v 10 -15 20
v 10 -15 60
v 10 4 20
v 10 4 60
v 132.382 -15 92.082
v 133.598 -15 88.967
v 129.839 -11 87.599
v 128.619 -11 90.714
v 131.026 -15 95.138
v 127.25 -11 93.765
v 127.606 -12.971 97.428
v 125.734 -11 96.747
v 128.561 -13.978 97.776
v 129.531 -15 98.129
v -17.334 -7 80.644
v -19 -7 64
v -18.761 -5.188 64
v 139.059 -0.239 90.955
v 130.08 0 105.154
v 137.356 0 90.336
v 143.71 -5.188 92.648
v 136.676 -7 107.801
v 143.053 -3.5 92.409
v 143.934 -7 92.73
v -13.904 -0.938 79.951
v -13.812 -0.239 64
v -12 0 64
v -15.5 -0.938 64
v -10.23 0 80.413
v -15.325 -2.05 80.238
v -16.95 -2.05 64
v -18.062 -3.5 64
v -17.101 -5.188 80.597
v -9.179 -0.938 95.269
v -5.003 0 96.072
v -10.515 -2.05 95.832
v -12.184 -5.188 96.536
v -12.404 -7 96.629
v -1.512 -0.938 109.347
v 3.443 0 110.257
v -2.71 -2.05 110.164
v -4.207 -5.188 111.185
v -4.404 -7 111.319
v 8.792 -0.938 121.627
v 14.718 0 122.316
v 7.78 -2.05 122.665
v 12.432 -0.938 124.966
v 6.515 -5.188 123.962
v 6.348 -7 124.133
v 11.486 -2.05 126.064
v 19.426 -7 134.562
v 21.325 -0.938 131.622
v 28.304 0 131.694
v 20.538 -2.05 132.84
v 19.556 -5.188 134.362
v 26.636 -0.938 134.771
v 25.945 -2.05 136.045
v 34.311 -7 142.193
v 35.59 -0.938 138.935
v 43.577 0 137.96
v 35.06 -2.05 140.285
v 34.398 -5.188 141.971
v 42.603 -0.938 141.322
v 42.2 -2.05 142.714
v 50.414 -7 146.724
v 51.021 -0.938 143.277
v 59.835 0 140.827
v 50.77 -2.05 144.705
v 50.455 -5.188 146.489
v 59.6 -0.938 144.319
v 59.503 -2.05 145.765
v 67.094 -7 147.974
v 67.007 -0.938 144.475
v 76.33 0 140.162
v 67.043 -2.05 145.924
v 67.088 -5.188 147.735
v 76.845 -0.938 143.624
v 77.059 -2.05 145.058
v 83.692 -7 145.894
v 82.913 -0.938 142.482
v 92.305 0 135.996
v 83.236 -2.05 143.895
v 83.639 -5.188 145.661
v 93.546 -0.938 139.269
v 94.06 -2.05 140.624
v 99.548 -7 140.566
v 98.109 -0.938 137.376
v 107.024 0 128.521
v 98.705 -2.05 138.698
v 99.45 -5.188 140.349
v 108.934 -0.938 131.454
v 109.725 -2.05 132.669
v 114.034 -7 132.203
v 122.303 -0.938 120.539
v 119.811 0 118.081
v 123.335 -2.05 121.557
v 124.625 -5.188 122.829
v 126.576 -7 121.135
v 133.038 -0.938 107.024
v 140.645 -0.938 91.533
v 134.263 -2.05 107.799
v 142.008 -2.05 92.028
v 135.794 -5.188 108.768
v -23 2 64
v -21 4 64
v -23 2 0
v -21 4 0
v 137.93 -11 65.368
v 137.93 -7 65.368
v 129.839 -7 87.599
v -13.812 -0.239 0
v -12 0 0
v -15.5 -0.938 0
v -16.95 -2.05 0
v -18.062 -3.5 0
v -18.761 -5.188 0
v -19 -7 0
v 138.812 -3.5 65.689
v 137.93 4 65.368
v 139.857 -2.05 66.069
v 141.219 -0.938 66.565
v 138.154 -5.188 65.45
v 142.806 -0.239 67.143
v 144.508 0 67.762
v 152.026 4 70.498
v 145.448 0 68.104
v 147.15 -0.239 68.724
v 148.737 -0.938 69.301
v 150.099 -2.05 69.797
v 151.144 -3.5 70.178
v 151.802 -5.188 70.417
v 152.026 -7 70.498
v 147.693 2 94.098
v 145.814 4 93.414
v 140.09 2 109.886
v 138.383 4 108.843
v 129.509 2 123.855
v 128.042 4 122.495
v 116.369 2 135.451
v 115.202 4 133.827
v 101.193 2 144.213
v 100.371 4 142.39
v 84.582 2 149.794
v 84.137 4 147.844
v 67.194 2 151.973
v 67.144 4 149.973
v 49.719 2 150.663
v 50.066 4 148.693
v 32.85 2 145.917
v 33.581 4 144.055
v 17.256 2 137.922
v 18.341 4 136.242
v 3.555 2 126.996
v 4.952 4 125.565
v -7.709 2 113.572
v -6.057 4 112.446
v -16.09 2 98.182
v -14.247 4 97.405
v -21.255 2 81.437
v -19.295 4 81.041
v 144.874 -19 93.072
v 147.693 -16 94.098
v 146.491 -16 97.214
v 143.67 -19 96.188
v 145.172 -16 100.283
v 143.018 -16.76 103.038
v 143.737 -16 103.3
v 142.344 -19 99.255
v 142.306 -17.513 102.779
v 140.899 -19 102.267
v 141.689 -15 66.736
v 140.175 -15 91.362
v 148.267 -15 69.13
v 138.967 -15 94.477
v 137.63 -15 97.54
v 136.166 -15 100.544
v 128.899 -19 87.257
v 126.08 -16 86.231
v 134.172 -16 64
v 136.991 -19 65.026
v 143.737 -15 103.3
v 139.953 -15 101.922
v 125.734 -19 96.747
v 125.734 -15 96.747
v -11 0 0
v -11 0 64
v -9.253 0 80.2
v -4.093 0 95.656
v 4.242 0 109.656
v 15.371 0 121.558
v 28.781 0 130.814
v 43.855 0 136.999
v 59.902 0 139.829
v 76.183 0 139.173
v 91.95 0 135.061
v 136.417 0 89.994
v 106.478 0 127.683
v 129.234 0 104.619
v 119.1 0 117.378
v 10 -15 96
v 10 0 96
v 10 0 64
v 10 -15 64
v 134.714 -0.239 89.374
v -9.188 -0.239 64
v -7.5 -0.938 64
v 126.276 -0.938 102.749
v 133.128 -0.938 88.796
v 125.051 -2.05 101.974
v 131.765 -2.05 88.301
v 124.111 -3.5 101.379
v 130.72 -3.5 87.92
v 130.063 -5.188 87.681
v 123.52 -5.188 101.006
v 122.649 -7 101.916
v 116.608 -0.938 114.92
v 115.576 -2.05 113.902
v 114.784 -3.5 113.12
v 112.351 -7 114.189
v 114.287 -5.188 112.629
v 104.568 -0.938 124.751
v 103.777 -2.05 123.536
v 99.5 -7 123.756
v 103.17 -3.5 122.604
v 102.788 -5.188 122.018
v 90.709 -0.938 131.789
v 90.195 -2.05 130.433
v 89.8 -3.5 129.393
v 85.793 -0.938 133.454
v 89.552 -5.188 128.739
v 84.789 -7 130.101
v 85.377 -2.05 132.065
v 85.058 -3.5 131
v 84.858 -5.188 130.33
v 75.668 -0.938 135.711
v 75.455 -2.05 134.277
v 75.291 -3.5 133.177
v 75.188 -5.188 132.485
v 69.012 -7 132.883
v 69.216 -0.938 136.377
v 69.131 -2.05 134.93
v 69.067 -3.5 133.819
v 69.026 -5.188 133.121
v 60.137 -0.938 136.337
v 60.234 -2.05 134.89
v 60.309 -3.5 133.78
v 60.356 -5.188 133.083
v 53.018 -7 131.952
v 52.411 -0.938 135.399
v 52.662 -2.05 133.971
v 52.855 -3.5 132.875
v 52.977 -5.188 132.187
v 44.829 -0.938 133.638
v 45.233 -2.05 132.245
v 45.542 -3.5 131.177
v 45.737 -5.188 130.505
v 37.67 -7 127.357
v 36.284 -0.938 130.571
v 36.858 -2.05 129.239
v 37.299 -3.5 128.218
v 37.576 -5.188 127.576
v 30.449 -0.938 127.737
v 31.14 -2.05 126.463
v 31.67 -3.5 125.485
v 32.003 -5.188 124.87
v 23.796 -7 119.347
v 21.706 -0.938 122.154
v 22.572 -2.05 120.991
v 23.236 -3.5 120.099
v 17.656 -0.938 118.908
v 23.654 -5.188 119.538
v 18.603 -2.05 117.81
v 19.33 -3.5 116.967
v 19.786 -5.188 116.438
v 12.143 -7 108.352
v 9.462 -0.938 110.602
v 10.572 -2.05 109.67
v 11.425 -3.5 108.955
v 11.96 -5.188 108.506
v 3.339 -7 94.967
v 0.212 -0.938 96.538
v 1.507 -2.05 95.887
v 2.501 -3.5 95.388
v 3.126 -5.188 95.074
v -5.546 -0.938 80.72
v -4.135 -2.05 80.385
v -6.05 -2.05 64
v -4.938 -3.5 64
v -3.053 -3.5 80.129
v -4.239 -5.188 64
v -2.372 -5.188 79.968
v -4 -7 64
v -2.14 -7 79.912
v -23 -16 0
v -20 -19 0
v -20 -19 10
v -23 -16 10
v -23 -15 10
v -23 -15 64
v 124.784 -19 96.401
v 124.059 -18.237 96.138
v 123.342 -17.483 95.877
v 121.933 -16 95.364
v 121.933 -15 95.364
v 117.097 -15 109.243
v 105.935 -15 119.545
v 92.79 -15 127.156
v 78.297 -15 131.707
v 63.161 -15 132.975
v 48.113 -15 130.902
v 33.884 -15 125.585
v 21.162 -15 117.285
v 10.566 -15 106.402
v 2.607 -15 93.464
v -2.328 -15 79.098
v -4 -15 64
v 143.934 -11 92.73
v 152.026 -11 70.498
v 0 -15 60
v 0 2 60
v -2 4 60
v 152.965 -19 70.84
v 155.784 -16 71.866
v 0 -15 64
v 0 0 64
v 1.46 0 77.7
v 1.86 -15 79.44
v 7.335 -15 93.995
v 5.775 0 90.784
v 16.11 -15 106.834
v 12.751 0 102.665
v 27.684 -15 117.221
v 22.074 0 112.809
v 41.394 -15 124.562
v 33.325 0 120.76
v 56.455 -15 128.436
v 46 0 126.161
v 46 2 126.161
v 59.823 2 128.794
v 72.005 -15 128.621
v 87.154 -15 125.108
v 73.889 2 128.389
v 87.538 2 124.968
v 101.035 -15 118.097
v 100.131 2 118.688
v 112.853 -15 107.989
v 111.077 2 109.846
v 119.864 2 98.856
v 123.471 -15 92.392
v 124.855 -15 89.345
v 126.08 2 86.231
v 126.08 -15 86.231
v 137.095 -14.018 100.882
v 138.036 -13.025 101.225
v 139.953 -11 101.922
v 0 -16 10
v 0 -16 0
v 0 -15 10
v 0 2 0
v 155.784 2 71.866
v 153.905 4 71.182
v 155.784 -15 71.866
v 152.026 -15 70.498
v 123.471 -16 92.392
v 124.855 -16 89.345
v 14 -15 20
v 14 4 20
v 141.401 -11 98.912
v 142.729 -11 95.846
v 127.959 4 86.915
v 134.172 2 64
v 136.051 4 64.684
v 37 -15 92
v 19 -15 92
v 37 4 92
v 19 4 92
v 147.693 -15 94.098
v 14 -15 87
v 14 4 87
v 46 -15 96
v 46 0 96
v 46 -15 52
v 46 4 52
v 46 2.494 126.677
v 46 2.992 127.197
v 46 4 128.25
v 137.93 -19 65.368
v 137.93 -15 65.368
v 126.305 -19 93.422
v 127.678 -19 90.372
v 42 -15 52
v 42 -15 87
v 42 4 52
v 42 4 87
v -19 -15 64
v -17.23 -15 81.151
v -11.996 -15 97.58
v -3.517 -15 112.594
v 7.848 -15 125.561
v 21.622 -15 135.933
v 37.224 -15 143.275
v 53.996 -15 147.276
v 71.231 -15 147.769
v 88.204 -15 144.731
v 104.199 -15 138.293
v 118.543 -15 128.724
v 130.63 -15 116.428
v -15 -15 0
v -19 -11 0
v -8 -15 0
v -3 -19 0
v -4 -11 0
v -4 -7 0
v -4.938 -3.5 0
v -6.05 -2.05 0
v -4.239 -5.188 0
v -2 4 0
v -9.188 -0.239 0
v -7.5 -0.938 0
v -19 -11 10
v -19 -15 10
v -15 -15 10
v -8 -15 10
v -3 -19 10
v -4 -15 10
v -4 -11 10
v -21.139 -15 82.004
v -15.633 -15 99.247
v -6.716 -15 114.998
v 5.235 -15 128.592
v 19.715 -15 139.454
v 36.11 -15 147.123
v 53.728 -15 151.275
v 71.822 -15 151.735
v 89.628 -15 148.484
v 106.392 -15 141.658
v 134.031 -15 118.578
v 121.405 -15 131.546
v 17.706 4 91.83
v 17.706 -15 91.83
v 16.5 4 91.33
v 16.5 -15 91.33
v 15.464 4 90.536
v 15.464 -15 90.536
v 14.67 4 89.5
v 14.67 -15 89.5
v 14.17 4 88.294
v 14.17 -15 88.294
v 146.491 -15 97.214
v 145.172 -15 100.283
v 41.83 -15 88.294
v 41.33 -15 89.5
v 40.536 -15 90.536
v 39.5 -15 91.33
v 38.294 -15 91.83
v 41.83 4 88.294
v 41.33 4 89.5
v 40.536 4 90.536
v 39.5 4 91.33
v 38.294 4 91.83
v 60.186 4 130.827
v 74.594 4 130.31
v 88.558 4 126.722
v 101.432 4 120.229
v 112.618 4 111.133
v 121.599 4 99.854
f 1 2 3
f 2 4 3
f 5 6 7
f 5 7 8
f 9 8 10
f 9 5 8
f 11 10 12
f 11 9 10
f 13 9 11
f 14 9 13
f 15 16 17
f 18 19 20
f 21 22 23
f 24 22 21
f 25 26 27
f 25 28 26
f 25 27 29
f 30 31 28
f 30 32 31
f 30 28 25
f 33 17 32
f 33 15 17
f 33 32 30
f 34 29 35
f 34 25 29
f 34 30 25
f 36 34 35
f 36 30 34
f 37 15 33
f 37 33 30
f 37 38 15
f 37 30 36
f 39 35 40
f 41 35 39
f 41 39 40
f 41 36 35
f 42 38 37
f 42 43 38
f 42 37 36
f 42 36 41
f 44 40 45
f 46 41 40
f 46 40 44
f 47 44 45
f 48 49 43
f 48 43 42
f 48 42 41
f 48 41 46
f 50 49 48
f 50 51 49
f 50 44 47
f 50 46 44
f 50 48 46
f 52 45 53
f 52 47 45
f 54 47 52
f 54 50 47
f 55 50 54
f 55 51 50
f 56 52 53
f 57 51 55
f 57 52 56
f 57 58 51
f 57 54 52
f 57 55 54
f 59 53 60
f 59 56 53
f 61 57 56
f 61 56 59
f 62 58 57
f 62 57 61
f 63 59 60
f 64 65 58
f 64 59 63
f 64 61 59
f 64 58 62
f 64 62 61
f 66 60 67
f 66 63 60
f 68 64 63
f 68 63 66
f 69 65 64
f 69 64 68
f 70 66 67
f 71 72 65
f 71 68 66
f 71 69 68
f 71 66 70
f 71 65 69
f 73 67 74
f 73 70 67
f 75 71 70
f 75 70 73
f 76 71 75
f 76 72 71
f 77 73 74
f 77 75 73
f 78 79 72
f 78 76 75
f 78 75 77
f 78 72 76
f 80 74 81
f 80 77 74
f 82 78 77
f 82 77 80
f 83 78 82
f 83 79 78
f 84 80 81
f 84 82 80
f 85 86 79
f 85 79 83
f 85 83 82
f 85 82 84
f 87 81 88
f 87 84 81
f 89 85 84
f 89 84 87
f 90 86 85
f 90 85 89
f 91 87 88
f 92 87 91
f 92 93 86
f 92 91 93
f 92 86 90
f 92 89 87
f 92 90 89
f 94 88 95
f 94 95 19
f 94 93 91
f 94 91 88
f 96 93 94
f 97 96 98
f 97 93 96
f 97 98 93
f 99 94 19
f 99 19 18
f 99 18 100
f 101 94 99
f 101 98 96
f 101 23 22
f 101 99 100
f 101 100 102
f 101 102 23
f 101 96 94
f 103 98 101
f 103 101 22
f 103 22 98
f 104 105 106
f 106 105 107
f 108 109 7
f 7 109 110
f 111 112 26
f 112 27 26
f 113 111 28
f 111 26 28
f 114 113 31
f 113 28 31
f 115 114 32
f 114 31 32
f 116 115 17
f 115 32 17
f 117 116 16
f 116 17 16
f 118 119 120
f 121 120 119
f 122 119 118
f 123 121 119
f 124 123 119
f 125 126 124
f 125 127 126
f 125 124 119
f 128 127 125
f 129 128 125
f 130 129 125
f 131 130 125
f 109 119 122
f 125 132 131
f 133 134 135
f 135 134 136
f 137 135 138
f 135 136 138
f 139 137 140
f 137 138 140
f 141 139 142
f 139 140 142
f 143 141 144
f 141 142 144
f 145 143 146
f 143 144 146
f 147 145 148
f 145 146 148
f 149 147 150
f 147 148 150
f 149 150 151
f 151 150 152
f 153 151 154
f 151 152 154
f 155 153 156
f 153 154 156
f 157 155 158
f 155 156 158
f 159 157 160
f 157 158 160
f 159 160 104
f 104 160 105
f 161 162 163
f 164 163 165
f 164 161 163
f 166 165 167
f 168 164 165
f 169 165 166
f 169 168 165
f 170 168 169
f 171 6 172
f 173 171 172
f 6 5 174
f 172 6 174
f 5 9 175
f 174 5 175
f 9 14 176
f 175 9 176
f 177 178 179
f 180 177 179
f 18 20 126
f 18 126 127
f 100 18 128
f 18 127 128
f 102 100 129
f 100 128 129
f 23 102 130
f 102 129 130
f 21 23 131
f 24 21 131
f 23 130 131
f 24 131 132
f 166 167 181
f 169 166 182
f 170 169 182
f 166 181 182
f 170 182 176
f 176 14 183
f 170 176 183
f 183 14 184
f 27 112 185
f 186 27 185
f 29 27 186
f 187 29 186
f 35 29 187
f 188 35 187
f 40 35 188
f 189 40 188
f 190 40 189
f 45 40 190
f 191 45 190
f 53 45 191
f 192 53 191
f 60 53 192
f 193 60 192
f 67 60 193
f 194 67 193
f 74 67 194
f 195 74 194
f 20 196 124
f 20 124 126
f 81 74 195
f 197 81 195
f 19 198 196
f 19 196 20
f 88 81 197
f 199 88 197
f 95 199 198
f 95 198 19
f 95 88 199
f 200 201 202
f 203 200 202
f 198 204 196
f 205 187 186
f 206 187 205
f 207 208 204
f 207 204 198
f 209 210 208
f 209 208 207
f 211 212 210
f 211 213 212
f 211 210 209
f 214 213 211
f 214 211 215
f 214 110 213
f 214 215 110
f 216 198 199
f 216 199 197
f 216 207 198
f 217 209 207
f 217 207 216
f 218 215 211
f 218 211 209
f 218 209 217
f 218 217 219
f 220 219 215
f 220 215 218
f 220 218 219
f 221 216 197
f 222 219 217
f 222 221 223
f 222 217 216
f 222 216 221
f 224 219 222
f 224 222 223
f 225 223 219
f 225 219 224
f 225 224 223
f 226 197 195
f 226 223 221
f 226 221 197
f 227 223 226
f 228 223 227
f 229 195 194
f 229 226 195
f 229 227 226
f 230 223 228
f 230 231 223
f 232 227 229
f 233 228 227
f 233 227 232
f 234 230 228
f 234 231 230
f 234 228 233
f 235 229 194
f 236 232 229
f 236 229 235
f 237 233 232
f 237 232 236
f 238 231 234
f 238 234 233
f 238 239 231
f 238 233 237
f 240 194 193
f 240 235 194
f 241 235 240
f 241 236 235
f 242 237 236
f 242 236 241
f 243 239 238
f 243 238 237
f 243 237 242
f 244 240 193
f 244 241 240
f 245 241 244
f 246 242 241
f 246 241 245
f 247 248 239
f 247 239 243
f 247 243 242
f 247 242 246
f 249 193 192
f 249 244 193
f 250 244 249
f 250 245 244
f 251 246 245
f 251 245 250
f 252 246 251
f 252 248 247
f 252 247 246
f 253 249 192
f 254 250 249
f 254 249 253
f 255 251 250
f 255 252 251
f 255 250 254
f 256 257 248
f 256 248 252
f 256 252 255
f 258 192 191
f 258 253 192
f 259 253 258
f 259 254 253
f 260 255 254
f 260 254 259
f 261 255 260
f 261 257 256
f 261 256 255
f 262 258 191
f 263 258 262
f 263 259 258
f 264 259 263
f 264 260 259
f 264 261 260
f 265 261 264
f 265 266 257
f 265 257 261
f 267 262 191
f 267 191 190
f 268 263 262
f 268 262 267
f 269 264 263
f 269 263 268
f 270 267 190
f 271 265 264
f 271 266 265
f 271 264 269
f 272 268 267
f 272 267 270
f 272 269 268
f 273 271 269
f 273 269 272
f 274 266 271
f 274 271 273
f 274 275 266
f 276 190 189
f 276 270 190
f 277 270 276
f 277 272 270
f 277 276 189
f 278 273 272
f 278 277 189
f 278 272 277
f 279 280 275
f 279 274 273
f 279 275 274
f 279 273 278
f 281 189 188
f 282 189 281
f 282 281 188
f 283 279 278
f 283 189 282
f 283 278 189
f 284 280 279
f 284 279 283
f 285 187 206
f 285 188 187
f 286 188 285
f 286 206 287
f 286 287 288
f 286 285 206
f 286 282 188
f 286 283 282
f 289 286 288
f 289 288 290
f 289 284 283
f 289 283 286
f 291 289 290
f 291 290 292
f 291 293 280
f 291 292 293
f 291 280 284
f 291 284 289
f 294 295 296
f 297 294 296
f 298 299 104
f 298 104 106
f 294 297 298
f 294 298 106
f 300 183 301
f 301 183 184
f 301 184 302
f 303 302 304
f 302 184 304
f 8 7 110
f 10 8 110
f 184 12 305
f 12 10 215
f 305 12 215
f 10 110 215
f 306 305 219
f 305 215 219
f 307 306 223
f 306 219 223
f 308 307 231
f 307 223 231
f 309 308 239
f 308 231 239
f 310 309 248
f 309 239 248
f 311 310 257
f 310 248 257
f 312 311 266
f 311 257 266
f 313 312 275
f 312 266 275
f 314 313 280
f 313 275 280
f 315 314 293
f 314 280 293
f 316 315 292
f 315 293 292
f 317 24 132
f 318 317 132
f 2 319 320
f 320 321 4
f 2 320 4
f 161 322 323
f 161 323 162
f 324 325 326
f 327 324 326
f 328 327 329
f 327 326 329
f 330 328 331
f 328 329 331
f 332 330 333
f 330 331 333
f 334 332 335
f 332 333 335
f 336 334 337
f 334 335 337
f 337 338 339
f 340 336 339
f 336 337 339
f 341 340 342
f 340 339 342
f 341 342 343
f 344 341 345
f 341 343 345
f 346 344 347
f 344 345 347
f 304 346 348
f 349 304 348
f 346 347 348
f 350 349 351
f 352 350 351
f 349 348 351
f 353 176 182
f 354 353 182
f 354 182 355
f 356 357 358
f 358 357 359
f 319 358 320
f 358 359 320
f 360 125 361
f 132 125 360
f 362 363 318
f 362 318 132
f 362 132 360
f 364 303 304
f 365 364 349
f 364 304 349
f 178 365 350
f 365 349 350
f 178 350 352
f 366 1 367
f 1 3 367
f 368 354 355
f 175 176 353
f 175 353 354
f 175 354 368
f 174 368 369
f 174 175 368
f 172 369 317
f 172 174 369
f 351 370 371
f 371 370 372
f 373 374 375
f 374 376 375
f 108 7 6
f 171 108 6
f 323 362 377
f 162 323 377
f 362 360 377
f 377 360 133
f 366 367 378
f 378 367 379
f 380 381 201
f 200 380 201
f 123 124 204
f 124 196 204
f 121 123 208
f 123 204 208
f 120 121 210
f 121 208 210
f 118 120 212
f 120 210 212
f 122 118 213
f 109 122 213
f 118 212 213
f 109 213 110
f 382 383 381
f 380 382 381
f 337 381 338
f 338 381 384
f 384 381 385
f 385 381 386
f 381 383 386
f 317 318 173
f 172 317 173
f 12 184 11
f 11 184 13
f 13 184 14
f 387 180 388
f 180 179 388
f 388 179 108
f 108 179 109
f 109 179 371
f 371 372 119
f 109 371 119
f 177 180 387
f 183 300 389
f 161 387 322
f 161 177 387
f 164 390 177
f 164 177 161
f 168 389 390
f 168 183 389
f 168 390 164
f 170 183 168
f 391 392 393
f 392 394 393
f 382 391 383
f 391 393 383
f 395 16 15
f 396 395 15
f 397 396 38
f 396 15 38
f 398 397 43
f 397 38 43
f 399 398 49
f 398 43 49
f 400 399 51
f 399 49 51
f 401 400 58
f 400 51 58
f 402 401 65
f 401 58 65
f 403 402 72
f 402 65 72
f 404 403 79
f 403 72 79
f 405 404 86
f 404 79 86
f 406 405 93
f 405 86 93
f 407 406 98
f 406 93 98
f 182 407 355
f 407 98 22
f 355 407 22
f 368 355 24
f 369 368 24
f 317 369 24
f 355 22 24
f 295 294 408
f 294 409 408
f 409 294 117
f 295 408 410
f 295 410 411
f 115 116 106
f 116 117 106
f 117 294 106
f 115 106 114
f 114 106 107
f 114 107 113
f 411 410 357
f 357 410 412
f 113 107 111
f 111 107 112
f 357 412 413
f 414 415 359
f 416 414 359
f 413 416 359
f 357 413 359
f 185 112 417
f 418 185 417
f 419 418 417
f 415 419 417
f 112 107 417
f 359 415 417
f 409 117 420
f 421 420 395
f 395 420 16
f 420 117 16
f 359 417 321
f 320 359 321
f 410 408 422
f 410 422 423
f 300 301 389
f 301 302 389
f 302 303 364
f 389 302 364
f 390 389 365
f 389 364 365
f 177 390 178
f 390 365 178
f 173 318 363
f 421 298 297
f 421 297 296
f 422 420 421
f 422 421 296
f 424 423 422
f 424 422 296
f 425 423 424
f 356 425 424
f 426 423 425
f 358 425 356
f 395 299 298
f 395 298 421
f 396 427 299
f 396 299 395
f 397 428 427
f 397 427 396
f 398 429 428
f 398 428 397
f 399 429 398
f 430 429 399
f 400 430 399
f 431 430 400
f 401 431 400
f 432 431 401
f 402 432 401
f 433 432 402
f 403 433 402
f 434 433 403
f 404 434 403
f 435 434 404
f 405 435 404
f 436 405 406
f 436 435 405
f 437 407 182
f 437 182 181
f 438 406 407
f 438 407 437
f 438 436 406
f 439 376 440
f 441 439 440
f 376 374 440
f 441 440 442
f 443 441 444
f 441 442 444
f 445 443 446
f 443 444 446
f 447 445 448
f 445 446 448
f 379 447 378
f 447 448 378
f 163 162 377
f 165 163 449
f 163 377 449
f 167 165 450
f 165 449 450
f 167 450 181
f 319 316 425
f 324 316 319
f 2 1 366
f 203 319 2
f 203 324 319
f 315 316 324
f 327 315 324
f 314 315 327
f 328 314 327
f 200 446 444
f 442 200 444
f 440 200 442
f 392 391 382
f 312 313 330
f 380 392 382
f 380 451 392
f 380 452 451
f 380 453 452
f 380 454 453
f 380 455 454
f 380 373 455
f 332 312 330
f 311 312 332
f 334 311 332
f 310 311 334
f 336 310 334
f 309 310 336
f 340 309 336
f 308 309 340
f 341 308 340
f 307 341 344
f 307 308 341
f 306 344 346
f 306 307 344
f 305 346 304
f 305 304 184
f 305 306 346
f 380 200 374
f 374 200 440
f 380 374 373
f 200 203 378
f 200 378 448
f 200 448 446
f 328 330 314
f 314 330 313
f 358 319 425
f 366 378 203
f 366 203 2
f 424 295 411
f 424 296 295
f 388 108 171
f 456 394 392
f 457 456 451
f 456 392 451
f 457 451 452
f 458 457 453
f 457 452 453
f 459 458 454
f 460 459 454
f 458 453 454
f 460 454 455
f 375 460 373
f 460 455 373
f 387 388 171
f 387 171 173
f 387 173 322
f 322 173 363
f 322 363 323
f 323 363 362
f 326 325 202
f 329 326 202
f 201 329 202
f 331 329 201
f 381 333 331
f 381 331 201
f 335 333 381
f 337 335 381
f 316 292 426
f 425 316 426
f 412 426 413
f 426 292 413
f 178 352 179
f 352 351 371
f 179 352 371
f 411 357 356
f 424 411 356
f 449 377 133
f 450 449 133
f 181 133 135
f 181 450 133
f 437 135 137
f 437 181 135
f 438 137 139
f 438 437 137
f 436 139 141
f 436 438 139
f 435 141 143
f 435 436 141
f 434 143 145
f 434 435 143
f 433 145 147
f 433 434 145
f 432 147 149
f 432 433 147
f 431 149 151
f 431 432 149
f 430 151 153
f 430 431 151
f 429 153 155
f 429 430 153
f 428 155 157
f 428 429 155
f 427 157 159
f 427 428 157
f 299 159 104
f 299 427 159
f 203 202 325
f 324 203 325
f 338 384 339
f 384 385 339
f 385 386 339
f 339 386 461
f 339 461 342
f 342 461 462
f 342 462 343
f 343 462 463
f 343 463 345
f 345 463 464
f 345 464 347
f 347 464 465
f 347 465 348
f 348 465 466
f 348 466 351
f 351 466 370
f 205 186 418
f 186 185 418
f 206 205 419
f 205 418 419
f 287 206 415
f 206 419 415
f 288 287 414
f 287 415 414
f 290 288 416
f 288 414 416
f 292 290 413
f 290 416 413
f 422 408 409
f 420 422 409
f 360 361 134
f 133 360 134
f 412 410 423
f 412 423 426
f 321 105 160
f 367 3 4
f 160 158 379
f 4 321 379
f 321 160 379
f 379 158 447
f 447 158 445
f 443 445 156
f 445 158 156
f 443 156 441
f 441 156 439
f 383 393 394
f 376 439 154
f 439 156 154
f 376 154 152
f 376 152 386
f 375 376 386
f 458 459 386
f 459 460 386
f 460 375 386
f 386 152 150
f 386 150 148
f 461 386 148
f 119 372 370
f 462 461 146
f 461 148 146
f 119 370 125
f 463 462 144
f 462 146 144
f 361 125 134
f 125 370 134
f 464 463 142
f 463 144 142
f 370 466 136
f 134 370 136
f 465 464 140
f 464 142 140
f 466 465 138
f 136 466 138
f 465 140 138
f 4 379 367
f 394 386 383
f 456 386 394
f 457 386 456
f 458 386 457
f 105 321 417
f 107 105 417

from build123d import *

# Parameters (mm, degrees)
F1_DEPTH     = 4
F2_DEPTH     = 15
F3_R         = 7
F4_SIZE      = 2
F5_W         = 19
F5_H         = 10
F5_W_2       = 4
F6_DEPTH     = 4
F7_T1_DEPTH  = 10
F7_T3_DEPTH  = 23.6580652273
F7_T5_DEPTH  = 23.6580652273
F7_T10_ANGLE = 16.8749432134
F7_T15_ANGLE = 13.853661309
F8_SIZE      = 3
F9_R         = 5


# Not quite as in the source:
# - a fillet or chamfer that OpenCascade refuses, or shapes differently, is made with other operations: its cross-section is extruded or revolved along the edge and cut away or added


with BuildPart() as f1:
    # F0 (on Front) → F1 (new body)
    with BuildSketch(Plane.XZ):
        Polygon((0, 0), (0, 60), (10, 60), (10, 20), (14, 20), (14, 64), (10, 64), (0, 64), (-4, 64), (-4, 0), align=None)
        with BuildLine():
            Line((-19, 0), (-4, 0))
            Line((-4, 0), (-4, 64))
            ThreePointArc((-4, 64), (53.018275741, 131.9517349578), (129.8387908342, 87.5993898895))
            Line((129.8387908342, 87.5993898895), (143.934180146, 92.7296920394))
            ThreePointArc((143.934180146, 92.7296920394), (50.413553076, 146.723851253), (-19, 64))
            Line((-19, 64), (-19, 0))
        make_face()
        with BuildLine():
            ThreePointArc((129.8387908342, 87.5993898895), (53.018275741, 131.9517349578), (-4, 64))
            Line((-4, 64), (0, 64))
            ThreePointArc((0, 64), (12.7505980895, 102.6652298584), (46, 126.1610810717))
            ThreePointArc((46, 126.1610810717), (94.0048047106, 122.1697627956), (126.0800203511, 86.2313093162))
            Line((126.0800203511, 86.2313093162), (129.8387908342, 87.5993898895))
        make_face()
        with BuildLine():
            Line((-23, 0), (-19, 0))
            Line((-19, 0), (-19, 64))
            ThreePointArc((-19, 64), (50.413553076, 146.723851253), (143.934180146, 92.7296920394))
            Line((143.934180146, 92.7296920394), (147.6929506292, 94.0977726127))
            ThreePointArc((147.6929506292, 94.0977726127), (49.7189603653, 150.6630822651), (-23, 64))
            Line((-23, 64), (-23, 0))
        make_face()
        Polygon((10, 64), (14, 64), (14, 92), (42, 92), (42, 52), (46, 52), (46, 92), (46, 96), (10, 96), (10, 92), align=None)
        with BuildLine():
            ThreePointArc((46, 126.1610810717), (12.7505980895, 102.6652298584), (0, 64))
            Line((0, 64), (10, 64))
            Line((10, 64), (10, 92))
            Line((10, 92), (10, 96))
            Line((10, 96), (46, 96))
            Line((46, 96), (46, 126.1610810717))
        make_face()
        Polygon((137.9303256941, 65.3680805733), (129.8387908342, 87.5993898895), (126.0800203511, 86.2313093162), (134.1715552109, 64), align=None)
        Polygon((143.934180146, 92.7296920394), (129.8387908342, 87.5993898895), (137.9303256941, 65.3680805733), (152.0257150059, 70.4983827232), align=None)
        Polygon((147.6929506292, 94.0977726127), (143.934180146, 92.7296920394), (152.0257150059, 70.4983827232), (155.784485489, 71.8664632965), align=None)
    extrude(amount=-F1_DEPTH)

    # F0 (on Front) → F2 (join)
    with BuildSketch(Plane.XZ):
        Polygon((0, 0), (0, 60), (10, 60), (10, 20), (14, 20), (14, 64), (10, 64), (0, 64), (-4, 64), (-4, 0), align=None)
        with BuildLine():
            ThreePointArc((129.8387908342, 87.5993898895), (53.018275741, 131.9517349578), (-4, 64))
            Line((-4, 64), (0, 64))
            ThreePointArc((0, 64), (12.7505980895, 102.6652298584), (46, 126.1610810717))
            ThreePointArc((46, 126.1610810717), (94.0048047106, 122.1697627956), (126.0800203511, 86.2313093162))
            Line((126.0800203511, 86.2313093162), (129.8387908342, 87.5993898895))
        make_face()
        with BuildLine():
            Line((-23, 0), (-19, 0))
            Line((-19, 0), (-19, 64))
            ThreePointArc((-19, 64), (50.413553076, 146.723851253), (143.934180146, 92.7296920394))
            Line((143.934180146, 92.7296920394), (147.6929506292, 94.0977726127))
            ThreePointArc((147.6929506292, 94.0977726127), (49.7189603653, 150.6630822651), (-23, 64))
            Line((-23, 64), (-23, 0))
        make_face()
        Polygon((147.6929506292, 94.0977726127), (143.934180146, 92.7296920394), (152.0257150059, 70.4983827232), (155.784485489, 71.8664632965), align=None)
        Polygon((137.9303256941, 65.3680805733), (129.8387908342, 87.5993898895), (126.0800203511, 86.2313093162), (134.1715552109, 64), align=None)
        Polygon((10, 64), (14, 64), (14, 92), (42, 92), (42, 52), (46, 52), (46, 92), (46, 96), (10, 96), (10, 92), align=None)
    extrude(amount=F2_DEPTH)

    # F3
    f3_edges = [f1.edges().sort_by_distance(p)[0] for p in [
        (50.413553, 0, 146.723851),
        (53.018276, 0, 131.951735),
        (133.884558, 0, 76.483735),
        (147.979948, 0, 81.614037),
        (-19, 0, 32),
        (-4, 0, 32),
    ]]
    fillet(f3_edges, radius=F3_R)

    # F4
    f4_edges = [f1.edges().sort_by_distance(p)[0] for p in [
        (130.125788, 4, 75.115655),
        (151.738718, 4, 82.982118),
        (0, 4, 30),
        (94.004805, 4, 122.169763),
        (49.71896, 4, 150.663082),
        (-23, 4, 32),
    ]]
    chamfer(f4_edges, length=F4_SIZE)

    # F5 (on face) → F6 (join)
    with BuildSketch(Plane.XZ.offset(15)):
        Polygon((137.9303256941, 65.3680805733), (129.8387908342, 87.5993898895), (126.0800203511, 86.2313093162), (134.1715552109, 64), align=None)
        Polygon((147.6929506292, 94.0977726127), (129.8387908342, 87.5993898895), (137.9303256941, 65.3680805733), (155.784485489, 71.8664632965), align=None)
        with Locations((-13.5, 5)):
            Rectangle(F5_W, F5_H)
        with Locations((-2, 5)):
            Rectangle(F5_W_2, F5_H)
        with BuildLine():
            Line((143.7370980696, 103.2997377546), (125.7340390711, 96.7471601534))
            ThreePointArc((125.7340390711, 96.7471601534), (127.95279444, 92.2479321755), (129.8387908342, 87.5993898895))
            Line((129.8387908342, 87.5993898895), (147.6929506292, 94.0977726127))
            ThreePointArc((147.6929506292, 94.0977726127), (145.8460524475, 98.7550831341), (143.7370980696, 103.2997377546))
        make_face()
        with BuildLine():
            ThreePointArc((129.8387908342, 87.5993898895), (127.95279444, 92.2479321755), (125.7340390711, 96.7471601534))
            Line((125.7340390711, 96.7471601534), (121.932649899, 95.3635676459))
            ThreePointArc((121.932649899, 95.3635676459), (124.1827434345, 90.8775534519), (126.0800203511, 86.2313093162))
            Line((126.0800203511, 86.2313093162), (129.8387908342, 87.5993898895))
        make_face()
    extrude(amount=F6_DEPTH)

    # F7: chamfer of 4 on 6 edges, made by hand

    # F7_s2 → F7_t1 (join)
    with BuildSketch(Plane.XY):
        Polygon((-15, -15), (-19, -11), (-19, -15), align=None)
        Polygon((-8, -15), (-4, -11), (-4, -15), align=None)
    extrude(amount=F7_T1_DEPTH)

    # F7_s4 → F7_t3 (join)
    with BuildSketch(Plane(origin=(-12.9656479113, 0, 35.622824865), x_dir=(0, 1, 0), z_dir=(0.3420201433, 0, -0.9396926208))):
        Polygon((-11, 166.9693095239), (-15, 162.9693095239), (-15, 166.9693095239), align=None)
    extrude(amount=F7_T3_DEPTH)

    # F7_s6 → F7_t5 (join)
    with BuildSketch(Plane(origin=(-4.8741130515, 0, 13.3915155488), x_dir=(0, 1, 0), z_dir=(-0.3420201433, 0, 0.9396926208))):
        Polygon((-11, -151.9693095239), (-15, -155.9693095239), (-15, -151.9693095239), align=None)
    extrude(amount=F7_T5_DEPTH)


with BuildPart() as f7_tool8:
    # F7_s9 → F7_t10 (revolve)
    with BuildSketch(Plane(origin=(-12.9656479113, 0, 35.622824865), x_dir=(0, 1, 0), z_dir=(0.3420201433, 0, -0.9396926208))):
        Polygon((-11, 151.9693095239), (-15, 155.9693095239), (-15, 151.9693095239), align=None)
    revolve(axis=Axis((65, -15, 64), (0, -1, 0)), revolution_arc=F7_T10_ANGLE)

    split(bisect_by=Plane(origin=(-16.3858493446, 0, 45.0197510729), x_dir=(0, 1, 0), z_dir=(0.3420201433, 0, -0.9396926208)), keep=Keep.TOP)


with BuildPart() as f1_1:
    add(f1.part)

    # F7_t7: union F7_tool8
    add(f7_tool8.part)


with BuildPart() as f7_tool13:
    # F7_s14 → F7_t15 (revolve)
    with BuildSketch(Plane(origin=(-9.4367447279, 0, 14.0679214359), x_dir=(0, 1, 0), z_dir=(-0.5570736436, 0, 0.830463097))):
        Polygon((-11, -173.6328145012), (-15, -169.6328145012), (-15, -173.6328145012), align=None)
    revolve(axis=Axis((65, -15, 64), (0, 1, 0)), revolution_arc=F7_T15_ANGLE)

    split(bisect_by=Plane(origin=(-16.3858493446, 0, 45.0197510729), x_dir=(0, 1, 0), z_dir=(0.3420201433, 0, -0.9396926208)), keep=Keep.TOP)


with BuildPart() as f1_2:
    add(f1_1.part)

    # F7_t12: union F7_tool13
    add(f7_tool13.part)

    # F8
    f8_edges = [f1_2.edges().sort_by_distance(p)[0] for p in [
        (-23, -19, 5),
        (0, -19, 5),
        (124.182743, -19, 90.877553),
        (145.846052, -19, 98.755083),
        (130.125788, -19, 75.115655),
        (151.738718, -19, 82.982118),
    ]]
    chamfer(f8_edges, length=F8_SIZE)

    # F9
    f9_edges = [f1_2.edges().sort_by_distance(p)[0] for p in [
        (42, -5.5, 92),
        (14, -5.5, 92),
    ]]
    fillet(f9_edges, radius=F9_R)


solid = f1_2.part
